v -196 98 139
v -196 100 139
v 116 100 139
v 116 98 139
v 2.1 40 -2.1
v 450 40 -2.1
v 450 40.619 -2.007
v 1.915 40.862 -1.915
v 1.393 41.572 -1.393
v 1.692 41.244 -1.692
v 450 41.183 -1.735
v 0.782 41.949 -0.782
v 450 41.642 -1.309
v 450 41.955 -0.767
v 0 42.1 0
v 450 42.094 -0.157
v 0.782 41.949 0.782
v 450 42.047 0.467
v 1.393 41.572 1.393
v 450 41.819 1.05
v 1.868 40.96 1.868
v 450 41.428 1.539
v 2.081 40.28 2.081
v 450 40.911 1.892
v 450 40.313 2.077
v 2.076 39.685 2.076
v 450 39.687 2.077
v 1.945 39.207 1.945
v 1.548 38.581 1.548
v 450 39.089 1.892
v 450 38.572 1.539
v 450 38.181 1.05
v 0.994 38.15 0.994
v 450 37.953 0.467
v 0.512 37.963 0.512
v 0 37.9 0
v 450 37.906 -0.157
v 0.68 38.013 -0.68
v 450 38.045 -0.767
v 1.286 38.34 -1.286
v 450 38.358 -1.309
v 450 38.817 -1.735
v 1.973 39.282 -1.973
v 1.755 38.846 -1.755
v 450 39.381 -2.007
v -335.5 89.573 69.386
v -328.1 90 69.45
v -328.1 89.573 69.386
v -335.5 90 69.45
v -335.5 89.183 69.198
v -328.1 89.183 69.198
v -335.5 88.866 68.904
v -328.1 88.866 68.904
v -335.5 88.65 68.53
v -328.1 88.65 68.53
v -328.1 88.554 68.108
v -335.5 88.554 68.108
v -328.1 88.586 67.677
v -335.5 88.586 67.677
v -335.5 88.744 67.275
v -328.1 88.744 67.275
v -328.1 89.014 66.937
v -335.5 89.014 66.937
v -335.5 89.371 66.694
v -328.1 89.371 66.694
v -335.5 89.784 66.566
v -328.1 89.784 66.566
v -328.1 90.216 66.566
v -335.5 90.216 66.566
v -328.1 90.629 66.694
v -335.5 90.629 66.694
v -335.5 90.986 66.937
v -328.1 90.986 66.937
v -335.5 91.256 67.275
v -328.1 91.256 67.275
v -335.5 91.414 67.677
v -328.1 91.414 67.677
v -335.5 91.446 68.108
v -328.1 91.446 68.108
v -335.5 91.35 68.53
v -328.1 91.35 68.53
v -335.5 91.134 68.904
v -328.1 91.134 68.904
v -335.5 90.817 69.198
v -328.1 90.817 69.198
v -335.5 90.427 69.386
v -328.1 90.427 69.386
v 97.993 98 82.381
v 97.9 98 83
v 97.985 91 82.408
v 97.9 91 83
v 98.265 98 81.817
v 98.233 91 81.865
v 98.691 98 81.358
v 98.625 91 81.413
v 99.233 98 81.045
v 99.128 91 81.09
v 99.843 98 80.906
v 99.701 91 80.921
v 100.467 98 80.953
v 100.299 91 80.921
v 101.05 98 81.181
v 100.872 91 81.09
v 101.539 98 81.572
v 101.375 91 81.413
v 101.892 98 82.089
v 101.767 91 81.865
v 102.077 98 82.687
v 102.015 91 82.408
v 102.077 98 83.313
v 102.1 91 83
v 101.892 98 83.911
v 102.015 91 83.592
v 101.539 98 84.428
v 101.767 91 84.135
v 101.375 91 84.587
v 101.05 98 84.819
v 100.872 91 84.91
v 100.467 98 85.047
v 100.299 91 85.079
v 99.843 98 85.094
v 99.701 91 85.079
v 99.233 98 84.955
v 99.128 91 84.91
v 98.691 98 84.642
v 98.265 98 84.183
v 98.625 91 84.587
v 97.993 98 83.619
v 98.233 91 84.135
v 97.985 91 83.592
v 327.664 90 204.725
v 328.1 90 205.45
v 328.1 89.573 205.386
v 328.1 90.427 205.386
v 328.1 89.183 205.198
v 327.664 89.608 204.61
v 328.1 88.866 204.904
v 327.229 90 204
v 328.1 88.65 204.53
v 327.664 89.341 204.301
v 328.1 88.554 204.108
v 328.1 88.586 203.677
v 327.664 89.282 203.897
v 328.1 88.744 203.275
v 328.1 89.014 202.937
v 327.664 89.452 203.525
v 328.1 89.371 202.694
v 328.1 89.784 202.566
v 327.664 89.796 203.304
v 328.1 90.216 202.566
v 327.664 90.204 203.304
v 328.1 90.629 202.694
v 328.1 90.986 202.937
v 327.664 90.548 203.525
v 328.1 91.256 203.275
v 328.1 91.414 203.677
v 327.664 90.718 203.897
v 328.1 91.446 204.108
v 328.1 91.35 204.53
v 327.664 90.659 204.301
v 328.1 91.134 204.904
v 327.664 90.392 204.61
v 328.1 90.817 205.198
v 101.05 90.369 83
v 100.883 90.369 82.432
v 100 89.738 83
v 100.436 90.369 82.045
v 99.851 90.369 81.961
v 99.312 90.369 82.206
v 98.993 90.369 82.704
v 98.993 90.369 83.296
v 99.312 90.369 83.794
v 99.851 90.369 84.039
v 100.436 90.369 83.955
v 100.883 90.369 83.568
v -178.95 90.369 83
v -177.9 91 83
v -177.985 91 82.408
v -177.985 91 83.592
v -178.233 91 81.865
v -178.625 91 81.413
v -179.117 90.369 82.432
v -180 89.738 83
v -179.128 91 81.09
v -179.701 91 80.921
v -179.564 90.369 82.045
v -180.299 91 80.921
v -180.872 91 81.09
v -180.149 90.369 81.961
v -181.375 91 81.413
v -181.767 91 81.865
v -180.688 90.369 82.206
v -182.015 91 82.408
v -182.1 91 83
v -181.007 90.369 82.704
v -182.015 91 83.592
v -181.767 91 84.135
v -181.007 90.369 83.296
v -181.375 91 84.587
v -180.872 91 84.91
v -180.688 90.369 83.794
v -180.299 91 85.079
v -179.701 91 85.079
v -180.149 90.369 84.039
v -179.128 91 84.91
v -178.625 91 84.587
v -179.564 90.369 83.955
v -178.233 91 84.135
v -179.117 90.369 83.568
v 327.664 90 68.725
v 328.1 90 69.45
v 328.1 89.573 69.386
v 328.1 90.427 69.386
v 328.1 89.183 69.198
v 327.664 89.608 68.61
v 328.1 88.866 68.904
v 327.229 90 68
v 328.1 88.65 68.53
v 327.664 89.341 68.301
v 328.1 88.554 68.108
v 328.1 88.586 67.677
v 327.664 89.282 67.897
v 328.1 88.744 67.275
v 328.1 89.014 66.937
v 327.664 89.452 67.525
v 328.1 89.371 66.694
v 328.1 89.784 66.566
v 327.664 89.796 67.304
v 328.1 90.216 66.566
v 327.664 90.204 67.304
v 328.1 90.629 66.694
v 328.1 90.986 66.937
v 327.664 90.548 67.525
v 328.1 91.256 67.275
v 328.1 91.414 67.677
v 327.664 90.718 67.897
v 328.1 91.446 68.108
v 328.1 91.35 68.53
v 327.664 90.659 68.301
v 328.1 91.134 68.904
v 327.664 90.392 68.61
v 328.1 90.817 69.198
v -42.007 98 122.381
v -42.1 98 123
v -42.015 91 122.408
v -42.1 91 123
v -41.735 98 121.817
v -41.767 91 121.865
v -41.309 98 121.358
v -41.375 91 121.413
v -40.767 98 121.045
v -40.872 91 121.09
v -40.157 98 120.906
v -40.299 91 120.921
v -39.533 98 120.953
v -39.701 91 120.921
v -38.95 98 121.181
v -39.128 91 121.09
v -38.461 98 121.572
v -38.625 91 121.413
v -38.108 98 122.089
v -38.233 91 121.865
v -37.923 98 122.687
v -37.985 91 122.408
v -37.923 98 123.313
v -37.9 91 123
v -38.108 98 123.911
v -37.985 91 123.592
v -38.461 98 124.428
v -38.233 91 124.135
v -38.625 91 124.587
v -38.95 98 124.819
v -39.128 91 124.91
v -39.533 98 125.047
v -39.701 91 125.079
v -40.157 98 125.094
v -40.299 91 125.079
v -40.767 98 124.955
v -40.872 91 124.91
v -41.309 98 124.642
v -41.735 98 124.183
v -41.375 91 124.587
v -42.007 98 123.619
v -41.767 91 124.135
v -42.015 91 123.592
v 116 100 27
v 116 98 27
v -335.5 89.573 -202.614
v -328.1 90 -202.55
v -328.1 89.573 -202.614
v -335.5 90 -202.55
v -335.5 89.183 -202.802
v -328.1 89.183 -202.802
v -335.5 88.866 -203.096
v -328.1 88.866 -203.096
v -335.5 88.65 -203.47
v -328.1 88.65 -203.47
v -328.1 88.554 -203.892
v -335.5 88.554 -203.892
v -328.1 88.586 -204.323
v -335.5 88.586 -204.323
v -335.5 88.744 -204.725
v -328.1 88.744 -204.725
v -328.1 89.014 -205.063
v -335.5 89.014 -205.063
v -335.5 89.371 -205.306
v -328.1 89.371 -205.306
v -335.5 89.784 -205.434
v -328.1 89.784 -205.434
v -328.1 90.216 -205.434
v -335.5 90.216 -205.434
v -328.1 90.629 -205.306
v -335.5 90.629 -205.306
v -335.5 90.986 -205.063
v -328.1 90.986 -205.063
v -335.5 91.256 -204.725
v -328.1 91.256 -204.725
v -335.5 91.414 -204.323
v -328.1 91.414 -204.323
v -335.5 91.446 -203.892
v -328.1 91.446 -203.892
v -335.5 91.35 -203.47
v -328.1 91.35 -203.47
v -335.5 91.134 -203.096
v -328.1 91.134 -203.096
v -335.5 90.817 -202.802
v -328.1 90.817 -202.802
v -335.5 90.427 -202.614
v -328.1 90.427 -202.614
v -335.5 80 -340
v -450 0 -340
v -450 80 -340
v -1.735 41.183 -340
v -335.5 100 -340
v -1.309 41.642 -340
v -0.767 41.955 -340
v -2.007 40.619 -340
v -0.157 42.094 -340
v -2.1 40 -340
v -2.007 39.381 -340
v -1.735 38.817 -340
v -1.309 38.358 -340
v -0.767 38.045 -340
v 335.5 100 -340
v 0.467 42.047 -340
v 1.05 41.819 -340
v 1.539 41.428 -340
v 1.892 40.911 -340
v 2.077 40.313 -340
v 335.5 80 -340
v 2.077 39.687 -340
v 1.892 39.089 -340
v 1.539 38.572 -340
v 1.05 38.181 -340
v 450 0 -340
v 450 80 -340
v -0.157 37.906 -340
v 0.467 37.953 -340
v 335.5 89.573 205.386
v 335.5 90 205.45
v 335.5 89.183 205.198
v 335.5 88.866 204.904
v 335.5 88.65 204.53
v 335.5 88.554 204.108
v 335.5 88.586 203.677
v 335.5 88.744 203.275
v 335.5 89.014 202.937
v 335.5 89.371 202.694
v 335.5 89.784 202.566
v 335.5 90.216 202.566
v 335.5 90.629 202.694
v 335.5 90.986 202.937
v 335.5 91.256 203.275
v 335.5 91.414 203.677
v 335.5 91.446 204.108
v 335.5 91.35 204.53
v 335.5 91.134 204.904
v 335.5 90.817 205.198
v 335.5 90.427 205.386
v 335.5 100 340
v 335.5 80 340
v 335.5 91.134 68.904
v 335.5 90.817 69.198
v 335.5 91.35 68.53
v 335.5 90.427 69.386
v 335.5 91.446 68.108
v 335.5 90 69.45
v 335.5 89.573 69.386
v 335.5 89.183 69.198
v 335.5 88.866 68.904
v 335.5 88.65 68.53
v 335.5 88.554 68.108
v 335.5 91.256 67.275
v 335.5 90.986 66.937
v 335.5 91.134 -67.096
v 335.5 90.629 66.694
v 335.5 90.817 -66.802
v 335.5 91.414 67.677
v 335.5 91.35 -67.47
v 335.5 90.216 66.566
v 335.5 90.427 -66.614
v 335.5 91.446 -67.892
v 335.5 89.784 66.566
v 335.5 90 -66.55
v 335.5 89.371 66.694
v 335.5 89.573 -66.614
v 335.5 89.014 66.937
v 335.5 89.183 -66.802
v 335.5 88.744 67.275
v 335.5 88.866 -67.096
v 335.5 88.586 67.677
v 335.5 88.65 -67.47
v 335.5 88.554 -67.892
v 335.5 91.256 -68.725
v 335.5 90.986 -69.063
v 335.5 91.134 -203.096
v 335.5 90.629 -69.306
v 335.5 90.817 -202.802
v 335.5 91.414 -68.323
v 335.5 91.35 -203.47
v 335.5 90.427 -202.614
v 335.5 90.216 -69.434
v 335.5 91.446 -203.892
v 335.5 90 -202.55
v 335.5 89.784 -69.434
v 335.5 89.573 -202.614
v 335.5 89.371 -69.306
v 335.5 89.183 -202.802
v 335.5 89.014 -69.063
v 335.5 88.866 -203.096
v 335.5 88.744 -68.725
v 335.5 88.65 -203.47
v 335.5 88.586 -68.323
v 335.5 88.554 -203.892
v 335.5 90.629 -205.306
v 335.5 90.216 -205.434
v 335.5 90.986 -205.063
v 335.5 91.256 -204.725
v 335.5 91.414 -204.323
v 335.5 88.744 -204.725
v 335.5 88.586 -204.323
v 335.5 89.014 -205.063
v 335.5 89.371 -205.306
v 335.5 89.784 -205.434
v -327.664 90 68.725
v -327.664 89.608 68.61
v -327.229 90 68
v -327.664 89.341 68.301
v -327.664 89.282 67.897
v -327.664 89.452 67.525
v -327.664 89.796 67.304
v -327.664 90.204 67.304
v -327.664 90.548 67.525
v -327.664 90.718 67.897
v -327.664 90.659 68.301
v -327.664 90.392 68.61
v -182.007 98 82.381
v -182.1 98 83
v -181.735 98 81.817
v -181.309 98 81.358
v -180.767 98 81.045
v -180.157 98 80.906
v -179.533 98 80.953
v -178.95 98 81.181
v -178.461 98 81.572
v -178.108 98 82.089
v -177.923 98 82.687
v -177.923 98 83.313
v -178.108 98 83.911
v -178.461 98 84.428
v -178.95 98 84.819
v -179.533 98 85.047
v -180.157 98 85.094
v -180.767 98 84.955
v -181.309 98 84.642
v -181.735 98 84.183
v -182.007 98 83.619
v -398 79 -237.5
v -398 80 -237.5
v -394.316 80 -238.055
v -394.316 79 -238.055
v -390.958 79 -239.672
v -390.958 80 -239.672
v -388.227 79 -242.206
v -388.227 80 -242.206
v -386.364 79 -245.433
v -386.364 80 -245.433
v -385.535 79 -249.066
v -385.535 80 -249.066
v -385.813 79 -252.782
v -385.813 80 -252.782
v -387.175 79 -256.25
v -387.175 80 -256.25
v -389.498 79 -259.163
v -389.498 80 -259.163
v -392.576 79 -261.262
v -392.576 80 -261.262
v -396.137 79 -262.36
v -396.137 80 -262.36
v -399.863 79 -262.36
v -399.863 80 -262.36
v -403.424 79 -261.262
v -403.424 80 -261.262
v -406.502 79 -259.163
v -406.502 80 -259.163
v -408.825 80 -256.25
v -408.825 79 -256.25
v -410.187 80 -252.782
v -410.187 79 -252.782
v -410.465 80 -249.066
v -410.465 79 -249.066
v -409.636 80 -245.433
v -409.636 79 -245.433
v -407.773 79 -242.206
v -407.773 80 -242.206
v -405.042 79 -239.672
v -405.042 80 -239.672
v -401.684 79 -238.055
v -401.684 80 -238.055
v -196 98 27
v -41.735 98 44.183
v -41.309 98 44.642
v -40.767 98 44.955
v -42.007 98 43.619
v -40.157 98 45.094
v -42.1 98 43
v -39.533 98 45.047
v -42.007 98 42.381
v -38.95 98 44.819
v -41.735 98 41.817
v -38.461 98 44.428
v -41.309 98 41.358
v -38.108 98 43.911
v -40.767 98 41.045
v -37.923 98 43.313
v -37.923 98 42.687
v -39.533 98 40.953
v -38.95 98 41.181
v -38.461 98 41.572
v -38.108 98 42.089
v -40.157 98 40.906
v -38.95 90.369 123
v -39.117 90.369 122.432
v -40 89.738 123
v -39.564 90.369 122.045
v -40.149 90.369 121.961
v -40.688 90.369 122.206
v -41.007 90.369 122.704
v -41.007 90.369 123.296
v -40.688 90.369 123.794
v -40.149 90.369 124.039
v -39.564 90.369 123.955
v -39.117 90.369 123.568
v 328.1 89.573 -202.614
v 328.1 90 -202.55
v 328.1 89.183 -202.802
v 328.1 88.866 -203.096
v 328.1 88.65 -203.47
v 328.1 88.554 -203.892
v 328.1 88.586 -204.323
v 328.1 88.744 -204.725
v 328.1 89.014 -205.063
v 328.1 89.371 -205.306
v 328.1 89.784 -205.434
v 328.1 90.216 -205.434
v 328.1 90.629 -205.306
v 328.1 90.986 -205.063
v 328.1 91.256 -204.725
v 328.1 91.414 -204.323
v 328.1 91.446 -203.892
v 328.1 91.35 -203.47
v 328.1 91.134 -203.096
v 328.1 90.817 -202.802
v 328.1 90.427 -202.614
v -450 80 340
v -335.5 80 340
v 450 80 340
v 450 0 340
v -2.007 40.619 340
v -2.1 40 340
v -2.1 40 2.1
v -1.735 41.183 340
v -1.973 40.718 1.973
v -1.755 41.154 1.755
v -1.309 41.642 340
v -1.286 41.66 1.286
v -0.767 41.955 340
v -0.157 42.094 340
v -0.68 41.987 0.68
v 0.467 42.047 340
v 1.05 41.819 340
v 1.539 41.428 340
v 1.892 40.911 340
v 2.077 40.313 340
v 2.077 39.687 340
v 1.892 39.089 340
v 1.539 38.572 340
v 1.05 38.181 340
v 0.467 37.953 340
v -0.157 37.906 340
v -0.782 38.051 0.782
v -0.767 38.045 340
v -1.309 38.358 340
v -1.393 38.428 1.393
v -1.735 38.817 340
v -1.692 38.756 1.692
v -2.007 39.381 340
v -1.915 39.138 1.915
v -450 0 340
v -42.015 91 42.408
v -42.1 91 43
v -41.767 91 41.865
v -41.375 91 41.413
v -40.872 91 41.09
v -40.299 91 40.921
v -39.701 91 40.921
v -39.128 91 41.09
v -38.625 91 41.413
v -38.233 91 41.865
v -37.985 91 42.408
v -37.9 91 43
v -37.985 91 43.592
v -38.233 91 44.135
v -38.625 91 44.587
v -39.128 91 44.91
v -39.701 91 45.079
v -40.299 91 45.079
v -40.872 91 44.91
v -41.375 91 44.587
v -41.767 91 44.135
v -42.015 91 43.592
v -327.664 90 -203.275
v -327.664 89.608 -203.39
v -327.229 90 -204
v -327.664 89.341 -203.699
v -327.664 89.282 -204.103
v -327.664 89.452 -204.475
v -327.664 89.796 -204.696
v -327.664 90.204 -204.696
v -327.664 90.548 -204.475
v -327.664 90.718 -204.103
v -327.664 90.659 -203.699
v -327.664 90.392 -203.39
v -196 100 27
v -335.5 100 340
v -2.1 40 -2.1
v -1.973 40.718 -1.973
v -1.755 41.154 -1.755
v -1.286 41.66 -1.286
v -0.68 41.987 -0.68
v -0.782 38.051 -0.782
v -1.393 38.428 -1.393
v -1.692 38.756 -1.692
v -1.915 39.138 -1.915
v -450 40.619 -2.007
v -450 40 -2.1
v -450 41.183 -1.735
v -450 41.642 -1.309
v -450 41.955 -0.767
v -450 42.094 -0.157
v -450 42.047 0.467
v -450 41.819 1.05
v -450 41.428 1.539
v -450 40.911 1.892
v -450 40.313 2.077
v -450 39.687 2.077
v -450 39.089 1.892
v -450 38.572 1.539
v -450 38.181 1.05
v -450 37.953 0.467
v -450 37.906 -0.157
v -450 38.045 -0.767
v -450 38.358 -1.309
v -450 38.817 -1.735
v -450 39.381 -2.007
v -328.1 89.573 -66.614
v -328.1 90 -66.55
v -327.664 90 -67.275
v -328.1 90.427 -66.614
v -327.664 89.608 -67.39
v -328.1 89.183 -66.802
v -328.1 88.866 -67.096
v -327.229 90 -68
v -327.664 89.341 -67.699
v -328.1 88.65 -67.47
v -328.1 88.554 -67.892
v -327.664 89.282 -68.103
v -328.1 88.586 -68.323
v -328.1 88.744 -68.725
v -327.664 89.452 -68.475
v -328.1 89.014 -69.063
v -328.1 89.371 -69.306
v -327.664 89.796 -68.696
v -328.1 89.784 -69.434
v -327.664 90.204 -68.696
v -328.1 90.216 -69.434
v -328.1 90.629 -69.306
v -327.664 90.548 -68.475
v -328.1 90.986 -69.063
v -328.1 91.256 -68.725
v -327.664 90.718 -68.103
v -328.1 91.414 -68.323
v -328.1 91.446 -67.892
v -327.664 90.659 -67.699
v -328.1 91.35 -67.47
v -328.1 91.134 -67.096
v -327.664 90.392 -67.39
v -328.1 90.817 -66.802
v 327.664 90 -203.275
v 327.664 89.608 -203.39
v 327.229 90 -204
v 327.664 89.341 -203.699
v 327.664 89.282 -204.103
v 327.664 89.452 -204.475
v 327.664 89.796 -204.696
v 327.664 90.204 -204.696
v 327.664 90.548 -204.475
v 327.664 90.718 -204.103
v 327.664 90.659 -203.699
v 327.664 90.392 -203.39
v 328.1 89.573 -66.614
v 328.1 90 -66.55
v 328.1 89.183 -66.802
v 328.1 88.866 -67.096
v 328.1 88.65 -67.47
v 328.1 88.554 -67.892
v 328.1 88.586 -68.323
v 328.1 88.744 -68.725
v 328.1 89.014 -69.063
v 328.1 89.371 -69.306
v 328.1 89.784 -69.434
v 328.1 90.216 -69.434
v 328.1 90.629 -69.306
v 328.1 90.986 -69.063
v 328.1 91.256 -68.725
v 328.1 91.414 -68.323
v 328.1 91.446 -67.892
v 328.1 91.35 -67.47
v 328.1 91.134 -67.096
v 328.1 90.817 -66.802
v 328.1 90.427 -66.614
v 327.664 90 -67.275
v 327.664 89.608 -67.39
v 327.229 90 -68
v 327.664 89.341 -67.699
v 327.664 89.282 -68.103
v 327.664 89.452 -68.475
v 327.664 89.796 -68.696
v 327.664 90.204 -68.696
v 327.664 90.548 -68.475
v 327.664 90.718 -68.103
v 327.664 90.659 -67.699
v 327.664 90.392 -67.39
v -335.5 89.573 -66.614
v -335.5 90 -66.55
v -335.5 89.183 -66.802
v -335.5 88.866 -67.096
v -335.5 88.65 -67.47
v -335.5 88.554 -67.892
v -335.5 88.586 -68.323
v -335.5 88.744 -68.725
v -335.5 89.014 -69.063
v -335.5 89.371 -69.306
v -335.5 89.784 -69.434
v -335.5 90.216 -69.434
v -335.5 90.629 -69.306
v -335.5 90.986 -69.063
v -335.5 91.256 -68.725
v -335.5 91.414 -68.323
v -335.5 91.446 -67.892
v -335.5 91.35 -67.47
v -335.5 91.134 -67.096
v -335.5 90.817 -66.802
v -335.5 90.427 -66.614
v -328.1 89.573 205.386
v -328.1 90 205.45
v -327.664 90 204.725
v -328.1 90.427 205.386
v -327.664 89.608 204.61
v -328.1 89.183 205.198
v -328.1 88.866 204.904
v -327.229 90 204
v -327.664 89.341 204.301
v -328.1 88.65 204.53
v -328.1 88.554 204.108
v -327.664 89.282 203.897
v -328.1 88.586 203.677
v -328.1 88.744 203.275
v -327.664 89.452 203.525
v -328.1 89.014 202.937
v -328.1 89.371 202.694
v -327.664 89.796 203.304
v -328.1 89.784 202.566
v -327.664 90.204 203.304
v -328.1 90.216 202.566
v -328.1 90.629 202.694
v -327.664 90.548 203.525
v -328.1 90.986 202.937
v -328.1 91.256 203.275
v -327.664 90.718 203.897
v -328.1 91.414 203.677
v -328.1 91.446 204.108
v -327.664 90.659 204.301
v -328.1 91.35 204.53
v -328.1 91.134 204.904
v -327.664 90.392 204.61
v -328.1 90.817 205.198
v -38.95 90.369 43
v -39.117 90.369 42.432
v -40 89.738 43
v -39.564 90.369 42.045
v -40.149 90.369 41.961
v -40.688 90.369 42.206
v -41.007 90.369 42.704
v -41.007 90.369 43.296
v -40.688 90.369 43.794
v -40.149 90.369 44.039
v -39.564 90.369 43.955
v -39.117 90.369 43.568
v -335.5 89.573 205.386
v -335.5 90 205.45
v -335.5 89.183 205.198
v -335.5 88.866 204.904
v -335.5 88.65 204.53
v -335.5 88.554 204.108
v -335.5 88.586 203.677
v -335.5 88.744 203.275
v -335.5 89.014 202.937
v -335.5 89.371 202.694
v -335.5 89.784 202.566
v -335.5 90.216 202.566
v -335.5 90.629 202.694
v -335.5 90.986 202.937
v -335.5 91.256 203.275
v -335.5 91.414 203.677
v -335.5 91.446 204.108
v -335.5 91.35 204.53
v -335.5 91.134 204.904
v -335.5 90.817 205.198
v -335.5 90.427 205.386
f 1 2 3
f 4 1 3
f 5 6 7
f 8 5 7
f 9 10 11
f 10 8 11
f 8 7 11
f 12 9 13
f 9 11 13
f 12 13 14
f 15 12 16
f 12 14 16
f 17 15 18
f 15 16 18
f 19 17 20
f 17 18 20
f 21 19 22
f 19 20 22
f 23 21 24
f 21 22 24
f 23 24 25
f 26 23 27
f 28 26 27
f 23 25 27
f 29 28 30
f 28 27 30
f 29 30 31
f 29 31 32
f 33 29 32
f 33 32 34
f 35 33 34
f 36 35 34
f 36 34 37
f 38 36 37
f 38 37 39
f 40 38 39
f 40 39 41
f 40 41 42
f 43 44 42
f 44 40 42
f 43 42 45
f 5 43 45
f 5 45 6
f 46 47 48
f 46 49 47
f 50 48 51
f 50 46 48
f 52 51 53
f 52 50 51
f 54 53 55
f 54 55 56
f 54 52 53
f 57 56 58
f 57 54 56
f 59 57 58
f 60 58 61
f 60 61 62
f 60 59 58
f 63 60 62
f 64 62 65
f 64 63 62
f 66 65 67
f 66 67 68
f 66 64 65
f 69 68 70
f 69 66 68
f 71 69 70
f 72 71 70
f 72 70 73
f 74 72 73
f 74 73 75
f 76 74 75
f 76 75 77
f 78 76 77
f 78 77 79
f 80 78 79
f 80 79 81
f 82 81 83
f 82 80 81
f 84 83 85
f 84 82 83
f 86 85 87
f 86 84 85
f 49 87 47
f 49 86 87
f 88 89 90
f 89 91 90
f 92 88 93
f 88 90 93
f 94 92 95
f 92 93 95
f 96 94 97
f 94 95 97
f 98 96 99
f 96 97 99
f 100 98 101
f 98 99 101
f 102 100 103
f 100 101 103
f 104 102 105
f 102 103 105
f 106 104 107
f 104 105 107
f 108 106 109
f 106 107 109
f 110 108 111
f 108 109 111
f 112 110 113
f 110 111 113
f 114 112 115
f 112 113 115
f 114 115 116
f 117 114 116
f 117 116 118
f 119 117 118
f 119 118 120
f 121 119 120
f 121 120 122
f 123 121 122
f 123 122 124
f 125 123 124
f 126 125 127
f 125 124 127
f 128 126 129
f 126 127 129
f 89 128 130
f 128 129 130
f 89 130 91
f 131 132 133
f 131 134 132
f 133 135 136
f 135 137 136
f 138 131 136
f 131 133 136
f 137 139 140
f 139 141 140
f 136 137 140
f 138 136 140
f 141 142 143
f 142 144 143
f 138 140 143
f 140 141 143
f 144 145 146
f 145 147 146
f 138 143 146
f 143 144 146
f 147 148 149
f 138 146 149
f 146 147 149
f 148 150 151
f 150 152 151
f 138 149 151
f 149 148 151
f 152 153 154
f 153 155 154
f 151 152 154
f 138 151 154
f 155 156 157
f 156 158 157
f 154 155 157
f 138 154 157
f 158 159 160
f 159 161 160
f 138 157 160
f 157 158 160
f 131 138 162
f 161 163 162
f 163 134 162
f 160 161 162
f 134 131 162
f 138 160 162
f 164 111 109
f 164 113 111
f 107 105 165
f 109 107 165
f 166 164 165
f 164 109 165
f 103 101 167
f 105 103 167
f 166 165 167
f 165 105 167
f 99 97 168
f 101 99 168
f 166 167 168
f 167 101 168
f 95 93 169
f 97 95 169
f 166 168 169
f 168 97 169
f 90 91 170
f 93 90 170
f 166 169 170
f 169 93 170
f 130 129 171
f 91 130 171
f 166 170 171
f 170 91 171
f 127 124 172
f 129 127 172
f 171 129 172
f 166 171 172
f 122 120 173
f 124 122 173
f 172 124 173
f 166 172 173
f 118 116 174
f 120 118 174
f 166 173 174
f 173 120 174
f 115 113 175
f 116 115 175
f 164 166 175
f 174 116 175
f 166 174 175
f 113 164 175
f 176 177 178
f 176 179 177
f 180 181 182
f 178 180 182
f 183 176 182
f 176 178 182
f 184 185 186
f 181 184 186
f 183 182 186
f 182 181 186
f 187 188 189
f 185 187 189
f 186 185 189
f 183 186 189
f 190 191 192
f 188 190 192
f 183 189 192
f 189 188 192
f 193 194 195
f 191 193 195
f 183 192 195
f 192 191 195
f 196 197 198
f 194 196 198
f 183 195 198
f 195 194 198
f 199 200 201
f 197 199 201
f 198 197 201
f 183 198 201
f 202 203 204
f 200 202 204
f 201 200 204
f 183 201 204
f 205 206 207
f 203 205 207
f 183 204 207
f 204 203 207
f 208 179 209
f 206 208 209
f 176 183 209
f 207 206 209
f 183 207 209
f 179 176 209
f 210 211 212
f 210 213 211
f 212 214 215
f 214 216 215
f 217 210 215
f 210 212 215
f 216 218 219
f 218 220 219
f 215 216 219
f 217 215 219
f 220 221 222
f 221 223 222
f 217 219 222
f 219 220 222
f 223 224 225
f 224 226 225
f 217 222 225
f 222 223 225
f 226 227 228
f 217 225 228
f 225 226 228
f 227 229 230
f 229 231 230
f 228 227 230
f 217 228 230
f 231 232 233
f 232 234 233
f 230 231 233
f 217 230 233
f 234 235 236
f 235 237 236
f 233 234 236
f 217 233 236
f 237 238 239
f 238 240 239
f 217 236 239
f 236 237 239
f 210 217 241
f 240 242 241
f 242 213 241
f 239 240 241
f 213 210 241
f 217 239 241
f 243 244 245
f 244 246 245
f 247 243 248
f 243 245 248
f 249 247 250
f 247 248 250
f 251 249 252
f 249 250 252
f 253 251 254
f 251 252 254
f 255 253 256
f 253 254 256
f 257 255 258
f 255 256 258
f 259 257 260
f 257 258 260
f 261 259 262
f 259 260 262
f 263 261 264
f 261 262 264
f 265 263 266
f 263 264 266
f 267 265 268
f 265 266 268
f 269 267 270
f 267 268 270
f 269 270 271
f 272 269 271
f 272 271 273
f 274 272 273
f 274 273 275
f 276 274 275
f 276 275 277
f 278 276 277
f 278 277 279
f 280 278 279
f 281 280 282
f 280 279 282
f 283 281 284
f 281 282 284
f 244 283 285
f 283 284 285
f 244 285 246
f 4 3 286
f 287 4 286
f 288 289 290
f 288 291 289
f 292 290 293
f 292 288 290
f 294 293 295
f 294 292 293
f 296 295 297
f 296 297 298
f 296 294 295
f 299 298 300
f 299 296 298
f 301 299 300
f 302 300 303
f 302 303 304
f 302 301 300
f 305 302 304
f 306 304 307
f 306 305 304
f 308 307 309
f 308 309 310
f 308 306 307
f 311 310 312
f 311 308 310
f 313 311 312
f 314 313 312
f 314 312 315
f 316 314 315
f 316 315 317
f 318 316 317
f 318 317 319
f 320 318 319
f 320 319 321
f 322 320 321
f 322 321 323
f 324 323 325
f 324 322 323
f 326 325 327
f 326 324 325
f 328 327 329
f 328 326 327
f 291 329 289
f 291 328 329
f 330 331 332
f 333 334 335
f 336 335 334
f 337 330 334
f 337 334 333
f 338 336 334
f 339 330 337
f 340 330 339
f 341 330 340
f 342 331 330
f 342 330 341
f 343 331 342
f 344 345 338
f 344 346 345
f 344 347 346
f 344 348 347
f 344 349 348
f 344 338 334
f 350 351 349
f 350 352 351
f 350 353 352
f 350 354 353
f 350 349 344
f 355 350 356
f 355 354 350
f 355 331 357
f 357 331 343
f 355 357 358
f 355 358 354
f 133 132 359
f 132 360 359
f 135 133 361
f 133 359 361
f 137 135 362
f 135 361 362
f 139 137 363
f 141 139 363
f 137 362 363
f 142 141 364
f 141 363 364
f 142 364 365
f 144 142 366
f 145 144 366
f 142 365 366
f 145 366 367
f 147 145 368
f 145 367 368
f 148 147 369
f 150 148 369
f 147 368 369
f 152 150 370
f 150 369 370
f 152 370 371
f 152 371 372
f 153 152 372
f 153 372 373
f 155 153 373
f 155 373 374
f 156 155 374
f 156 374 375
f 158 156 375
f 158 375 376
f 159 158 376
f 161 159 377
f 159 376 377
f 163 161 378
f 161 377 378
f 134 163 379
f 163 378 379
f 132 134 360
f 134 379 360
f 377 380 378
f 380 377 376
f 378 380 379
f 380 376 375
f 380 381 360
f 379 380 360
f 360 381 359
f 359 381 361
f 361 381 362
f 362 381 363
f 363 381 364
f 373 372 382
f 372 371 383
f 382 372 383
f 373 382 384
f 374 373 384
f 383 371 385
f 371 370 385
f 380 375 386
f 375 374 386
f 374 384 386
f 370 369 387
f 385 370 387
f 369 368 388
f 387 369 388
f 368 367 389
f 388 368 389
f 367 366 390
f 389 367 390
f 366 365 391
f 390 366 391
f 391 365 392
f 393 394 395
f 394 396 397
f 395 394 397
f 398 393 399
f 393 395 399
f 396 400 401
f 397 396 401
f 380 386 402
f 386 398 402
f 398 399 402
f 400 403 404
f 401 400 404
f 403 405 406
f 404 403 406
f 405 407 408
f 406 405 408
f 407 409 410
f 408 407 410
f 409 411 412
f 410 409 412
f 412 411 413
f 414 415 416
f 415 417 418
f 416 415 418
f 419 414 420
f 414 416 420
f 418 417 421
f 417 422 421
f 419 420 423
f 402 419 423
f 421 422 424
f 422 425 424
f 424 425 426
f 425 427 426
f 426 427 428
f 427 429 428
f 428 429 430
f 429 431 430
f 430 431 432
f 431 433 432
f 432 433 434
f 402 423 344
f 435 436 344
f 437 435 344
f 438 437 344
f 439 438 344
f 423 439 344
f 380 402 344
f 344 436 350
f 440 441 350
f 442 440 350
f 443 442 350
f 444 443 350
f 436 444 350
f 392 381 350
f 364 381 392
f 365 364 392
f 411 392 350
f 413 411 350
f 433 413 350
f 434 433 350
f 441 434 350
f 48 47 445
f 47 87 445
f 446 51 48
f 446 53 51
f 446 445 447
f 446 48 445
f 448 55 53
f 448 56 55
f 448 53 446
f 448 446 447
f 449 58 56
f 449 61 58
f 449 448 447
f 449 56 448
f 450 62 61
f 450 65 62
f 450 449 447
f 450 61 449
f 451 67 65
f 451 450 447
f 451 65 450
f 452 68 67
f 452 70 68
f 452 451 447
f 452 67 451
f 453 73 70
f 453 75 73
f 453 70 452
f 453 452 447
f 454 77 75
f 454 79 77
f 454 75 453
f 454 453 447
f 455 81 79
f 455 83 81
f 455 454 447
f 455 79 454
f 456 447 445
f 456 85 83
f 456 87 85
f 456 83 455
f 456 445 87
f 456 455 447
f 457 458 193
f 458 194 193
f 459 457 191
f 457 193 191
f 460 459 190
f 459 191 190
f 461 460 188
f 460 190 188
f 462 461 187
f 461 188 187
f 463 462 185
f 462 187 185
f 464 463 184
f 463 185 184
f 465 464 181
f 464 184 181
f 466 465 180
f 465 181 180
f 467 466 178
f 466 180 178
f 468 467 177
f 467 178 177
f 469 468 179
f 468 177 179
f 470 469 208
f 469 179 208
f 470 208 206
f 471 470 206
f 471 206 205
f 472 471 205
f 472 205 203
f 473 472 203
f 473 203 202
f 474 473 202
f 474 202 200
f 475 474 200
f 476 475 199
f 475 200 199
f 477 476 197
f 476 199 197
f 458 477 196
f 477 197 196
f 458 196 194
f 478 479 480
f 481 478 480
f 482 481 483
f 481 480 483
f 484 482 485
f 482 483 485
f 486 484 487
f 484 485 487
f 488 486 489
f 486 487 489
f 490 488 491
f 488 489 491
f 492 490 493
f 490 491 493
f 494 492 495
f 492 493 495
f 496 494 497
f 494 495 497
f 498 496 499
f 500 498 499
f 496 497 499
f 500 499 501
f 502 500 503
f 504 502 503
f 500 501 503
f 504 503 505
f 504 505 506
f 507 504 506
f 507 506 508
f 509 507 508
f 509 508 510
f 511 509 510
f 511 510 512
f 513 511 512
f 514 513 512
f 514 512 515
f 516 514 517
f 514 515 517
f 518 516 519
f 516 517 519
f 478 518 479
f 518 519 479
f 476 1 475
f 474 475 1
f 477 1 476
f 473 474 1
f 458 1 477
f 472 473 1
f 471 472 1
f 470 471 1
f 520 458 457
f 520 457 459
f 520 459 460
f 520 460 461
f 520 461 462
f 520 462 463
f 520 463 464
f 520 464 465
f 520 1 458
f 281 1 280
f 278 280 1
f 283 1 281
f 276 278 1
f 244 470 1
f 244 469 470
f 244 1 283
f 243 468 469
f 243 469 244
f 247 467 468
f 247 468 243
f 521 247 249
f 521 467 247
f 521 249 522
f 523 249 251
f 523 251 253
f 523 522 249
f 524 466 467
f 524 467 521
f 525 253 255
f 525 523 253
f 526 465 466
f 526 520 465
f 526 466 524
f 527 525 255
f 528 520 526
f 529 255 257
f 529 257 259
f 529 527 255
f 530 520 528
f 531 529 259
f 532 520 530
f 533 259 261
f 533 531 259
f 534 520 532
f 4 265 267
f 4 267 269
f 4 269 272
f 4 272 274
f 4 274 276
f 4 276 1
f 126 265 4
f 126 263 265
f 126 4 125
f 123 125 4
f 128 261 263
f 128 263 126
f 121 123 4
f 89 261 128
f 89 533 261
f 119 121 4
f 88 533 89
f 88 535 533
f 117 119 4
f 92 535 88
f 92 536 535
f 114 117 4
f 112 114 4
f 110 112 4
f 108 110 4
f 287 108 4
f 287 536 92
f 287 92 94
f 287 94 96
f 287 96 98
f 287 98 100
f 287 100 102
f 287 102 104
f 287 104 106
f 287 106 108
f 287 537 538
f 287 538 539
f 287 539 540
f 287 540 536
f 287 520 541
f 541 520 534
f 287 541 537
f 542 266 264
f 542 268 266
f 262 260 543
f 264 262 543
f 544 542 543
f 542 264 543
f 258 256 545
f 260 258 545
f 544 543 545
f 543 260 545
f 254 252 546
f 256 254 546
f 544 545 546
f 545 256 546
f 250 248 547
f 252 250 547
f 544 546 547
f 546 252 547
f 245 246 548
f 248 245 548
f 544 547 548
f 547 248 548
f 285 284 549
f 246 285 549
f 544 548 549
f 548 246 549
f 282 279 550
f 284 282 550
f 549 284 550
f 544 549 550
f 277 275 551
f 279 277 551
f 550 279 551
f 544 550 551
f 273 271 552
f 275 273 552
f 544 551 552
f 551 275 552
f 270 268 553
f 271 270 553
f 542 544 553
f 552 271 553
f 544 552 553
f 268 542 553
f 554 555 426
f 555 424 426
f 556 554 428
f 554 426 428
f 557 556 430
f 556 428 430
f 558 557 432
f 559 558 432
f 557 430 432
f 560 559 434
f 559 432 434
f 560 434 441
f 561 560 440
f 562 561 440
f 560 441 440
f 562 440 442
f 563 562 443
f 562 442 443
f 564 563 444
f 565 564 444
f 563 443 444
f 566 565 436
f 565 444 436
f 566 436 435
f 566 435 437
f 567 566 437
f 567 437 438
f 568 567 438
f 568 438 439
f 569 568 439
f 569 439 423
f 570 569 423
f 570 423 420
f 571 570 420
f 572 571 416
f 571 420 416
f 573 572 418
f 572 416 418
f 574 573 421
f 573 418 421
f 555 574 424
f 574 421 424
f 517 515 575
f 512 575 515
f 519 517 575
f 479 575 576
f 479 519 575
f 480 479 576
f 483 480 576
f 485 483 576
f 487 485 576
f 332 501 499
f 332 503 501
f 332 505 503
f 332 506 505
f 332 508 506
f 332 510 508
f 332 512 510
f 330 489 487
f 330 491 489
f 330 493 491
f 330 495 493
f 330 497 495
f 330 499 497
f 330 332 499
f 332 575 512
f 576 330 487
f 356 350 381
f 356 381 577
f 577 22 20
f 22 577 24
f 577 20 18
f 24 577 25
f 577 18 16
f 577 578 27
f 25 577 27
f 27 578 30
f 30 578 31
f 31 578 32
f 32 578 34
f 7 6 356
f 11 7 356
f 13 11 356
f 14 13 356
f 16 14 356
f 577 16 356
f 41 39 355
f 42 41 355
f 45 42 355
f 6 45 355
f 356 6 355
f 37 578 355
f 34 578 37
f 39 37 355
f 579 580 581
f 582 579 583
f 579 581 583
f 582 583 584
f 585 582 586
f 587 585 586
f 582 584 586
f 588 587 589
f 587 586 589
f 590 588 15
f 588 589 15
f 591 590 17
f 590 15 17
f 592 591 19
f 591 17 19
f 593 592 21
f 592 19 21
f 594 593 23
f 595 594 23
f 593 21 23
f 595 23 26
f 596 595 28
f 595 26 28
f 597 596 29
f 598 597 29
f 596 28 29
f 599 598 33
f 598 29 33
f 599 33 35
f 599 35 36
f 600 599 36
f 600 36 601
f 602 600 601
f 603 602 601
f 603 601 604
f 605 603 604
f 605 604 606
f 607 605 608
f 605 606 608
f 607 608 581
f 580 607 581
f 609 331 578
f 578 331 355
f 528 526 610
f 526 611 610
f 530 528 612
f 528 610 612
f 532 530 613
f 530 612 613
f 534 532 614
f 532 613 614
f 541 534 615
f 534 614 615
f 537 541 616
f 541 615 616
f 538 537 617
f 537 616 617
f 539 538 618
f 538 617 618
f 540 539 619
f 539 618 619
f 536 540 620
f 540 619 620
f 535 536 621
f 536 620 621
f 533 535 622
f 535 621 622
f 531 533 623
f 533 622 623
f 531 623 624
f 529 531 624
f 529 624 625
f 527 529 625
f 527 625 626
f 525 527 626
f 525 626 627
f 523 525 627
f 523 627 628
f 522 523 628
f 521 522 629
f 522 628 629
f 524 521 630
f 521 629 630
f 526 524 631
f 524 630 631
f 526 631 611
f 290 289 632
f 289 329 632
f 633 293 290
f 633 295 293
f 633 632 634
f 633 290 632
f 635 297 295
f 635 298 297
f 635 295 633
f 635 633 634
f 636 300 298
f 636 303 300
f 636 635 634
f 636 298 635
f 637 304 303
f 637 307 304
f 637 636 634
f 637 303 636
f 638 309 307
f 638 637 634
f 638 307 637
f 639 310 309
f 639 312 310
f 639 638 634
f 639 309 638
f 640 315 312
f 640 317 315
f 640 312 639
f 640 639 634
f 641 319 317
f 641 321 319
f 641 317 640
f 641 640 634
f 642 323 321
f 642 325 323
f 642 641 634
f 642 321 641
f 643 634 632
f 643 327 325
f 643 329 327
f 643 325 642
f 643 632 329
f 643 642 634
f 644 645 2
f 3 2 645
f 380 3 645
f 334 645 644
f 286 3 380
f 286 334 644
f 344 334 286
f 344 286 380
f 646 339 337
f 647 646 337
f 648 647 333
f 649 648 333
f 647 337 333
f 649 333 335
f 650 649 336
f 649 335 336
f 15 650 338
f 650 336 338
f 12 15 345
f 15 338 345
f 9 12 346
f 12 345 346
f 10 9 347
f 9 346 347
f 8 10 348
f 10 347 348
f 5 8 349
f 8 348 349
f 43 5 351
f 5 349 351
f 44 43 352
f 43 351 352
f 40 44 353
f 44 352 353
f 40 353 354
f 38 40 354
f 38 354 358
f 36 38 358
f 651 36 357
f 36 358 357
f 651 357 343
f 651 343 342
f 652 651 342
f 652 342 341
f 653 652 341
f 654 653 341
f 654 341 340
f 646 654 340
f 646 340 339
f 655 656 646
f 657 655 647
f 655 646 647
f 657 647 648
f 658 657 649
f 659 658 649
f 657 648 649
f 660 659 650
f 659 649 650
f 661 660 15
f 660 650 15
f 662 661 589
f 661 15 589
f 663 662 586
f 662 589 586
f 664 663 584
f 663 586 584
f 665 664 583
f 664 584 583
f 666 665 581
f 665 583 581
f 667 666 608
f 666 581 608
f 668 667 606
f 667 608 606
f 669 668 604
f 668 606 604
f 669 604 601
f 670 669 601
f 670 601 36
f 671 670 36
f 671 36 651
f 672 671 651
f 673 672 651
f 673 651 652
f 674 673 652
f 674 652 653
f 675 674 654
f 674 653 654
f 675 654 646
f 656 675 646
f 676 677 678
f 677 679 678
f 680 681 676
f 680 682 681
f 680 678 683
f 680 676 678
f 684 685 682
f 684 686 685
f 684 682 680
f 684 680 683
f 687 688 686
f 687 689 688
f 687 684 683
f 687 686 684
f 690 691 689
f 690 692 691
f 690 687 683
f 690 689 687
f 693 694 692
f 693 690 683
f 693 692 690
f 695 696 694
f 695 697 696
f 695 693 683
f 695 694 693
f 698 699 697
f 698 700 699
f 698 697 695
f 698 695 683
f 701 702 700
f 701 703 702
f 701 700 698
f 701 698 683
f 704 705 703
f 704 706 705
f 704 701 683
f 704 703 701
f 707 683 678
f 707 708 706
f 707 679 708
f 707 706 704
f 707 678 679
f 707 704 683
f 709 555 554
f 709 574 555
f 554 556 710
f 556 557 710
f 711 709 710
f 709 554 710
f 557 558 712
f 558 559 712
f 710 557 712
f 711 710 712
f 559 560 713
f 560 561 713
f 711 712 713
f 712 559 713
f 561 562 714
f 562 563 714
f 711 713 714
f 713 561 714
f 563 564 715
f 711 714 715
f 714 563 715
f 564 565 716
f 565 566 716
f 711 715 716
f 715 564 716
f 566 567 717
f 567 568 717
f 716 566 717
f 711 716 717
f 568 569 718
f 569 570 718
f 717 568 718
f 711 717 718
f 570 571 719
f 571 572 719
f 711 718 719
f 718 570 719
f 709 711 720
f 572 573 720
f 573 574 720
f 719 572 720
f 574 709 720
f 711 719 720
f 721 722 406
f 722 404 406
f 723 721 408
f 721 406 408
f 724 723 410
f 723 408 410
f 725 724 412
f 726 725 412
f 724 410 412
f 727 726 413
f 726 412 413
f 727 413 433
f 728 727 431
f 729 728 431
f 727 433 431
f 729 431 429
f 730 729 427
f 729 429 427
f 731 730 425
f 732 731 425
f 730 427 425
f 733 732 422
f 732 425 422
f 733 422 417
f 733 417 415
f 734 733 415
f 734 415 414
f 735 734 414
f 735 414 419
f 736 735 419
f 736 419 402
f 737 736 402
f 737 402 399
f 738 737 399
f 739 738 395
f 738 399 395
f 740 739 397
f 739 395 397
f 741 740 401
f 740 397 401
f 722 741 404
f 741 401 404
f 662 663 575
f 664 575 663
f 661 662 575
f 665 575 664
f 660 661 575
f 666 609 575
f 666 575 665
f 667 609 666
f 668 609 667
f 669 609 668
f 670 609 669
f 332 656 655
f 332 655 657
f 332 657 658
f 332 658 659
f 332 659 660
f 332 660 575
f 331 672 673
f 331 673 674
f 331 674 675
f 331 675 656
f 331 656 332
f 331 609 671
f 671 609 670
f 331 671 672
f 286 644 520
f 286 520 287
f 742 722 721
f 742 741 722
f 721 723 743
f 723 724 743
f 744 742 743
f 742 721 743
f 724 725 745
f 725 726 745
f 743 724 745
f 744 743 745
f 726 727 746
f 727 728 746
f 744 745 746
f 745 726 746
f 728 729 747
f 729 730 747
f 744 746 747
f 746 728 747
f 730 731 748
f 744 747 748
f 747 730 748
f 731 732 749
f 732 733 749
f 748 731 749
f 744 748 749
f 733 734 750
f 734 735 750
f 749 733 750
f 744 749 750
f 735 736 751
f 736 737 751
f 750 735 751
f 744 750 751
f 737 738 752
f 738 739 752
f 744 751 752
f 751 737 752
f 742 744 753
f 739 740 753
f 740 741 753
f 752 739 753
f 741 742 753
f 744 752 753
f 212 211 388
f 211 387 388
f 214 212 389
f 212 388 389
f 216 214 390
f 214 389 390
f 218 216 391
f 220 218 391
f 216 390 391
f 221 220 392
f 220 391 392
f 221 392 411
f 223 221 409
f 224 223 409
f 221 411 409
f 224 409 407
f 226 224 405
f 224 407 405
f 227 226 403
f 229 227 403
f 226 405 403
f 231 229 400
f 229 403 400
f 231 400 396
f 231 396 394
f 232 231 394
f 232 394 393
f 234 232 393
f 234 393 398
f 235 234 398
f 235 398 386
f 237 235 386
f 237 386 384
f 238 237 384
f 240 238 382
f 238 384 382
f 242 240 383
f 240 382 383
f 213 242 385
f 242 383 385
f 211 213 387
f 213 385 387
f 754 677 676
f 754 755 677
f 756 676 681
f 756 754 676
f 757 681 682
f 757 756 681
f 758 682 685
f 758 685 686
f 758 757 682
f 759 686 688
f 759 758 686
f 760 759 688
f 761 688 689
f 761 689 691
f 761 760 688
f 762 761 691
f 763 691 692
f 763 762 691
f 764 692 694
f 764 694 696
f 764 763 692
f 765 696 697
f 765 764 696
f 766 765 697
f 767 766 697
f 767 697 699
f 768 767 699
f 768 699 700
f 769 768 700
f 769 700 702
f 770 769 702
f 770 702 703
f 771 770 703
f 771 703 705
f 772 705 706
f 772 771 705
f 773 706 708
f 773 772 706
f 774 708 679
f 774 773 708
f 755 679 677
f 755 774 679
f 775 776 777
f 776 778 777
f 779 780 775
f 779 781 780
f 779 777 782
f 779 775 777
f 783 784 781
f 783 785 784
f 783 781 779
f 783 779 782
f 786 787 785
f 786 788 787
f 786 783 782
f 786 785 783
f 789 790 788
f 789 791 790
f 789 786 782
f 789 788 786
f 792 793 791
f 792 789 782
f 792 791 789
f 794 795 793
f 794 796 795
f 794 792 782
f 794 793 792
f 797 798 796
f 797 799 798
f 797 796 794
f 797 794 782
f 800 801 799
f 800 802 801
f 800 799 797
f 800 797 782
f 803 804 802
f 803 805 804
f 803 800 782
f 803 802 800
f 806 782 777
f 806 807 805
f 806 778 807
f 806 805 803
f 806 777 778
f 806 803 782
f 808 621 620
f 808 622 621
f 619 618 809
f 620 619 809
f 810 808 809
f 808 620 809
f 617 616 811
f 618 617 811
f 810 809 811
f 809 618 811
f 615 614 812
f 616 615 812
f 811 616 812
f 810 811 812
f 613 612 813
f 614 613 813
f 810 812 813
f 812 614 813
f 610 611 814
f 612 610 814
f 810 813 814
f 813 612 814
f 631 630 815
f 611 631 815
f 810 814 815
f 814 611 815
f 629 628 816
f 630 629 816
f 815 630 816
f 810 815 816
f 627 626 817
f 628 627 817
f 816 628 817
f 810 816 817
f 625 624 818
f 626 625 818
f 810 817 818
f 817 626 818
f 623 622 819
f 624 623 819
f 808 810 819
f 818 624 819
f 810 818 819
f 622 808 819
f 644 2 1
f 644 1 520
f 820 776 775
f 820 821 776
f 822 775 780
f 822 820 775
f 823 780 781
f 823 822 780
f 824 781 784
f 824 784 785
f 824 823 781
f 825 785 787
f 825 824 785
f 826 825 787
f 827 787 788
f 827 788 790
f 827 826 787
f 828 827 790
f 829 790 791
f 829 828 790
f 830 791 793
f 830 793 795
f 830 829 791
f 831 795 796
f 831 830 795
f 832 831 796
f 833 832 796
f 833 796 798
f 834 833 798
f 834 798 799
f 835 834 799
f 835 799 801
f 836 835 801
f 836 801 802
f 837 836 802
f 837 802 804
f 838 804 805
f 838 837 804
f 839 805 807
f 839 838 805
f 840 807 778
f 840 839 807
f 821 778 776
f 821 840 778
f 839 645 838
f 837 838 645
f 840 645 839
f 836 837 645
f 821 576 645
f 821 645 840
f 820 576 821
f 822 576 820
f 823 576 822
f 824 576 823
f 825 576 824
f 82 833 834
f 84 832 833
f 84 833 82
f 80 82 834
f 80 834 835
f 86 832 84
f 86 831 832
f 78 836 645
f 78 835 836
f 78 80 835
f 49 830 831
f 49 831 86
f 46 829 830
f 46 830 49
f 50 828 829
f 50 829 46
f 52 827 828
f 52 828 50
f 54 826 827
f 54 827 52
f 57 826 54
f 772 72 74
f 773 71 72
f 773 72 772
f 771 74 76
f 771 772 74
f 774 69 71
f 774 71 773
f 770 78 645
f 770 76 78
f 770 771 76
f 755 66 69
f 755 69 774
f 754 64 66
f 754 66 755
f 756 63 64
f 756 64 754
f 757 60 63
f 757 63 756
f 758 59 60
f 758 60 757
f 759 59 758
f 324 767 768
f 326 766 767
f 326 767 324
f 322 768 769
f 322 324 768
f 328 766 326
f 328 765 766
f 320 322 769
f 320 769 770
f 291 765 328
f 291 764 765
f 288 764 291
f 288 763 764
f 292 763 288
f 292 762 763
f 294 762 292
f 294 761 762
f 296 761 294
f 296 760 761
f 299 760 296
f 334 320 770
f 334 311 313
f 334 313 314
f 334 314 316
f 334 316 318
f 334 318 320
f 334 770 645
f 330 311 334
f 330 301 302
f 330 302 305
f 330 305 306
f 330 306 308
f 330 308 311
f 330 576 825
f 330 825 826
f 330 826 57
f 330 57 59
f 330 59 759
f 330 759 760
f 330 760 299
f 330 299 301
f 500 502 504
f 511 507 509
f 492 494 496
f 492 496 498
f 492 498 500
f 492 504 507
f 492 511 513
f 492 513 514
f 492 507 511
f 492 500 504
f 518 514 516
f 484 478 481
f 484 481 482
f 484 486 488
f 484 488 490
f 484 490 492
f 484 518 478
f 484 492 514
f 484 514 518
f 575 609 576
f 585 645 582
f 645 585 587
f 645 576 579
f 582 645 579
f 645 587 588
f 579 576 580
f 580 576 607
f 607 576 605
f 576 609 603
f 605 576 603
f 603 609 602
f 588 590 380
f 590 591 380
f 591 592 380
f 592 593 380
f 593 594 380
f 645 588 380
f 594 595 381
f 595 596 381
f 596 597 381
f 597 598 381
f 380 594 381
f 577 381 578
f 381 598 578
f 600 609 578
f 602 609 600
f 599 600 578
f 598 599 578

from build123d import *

# Parameters (mm, degrees)
SKETCH_1_W                    = 900
SKETCH_1_H                    = 680
EXTRUDE_1_DEPTH               = 80
SKETCH_2_W                    = 671
SKETCH_2_H                    = 680
EXTRUDE_2_DEPTH               = 20
SKETCH_4_W                    = 312
SKETCH_4_H                    = 112
CUT_EXTRUDE_1_DEPTH           = 2
HOLE_WIZARD_M5_1_D            = 4.2
HOLE_WIZARD_M5_1_DEPTH        = 9
HOLE_WIZARD_M5_1_TIP          = 1.2618073
HOLE_WIZARD_M5_2_D            = 4.2
HOLE_WIZARD_M5_3_D            = 4.2
SKETCH_15_R                   = 12.5
CUT_EXTRUDE_2_DEPTH           = 1
HOLE_WIZARD_M3_5_1_AT_2_COUNT = 2
HOLE_WIZARD_M3_5_1_AT_2_PITCH = 136
HOLE_WIZARD_M3_5_1_AT_3_COUNT = 2
HOLE_WIZARD_M3_5_1_AT_3_PITCH = 272
HOLE_WIZARD_M3_5_1_AT_4_COUNT = 2
HOLE_WIZARD_M3_5_1_AT_4_PITCH = 408


with BuildPart() as part:
    # 草图1 → 凸台-拉伸1 (new body)
    with BuildSketch(Plane(origin=(0, 0, 0), x_dir=(1, 0, 0), z_dir=(0, 1, 0))):
        Rectangle(SKETCH_1_W, SKETCH_1_H)
    extrude(amount=EXTRUDE_1_DEPTH)

    # 草图2 → 凸台-拉伸2 (add)
    with BuildSketch(Plane(origin=(0, 80, 0), x_dir=(1, 0, 0), z_dir=(0, 1, 0))):
        Rectangle(SKETCH_2_W, SKETCH_2_H)
    extrude(amount=EXTRUDE_2_DEPTH)

    # 草图4 → 切除-拉伸1 (cut)
    with BuildSketch(Plane(origin=(0, 100, 0), x_dir=(1, 0, 0), z_dir=(0, 1, 0))):
        with Locations((-40, -83)):
            Rectangle(SKETCH_4_W, SKETCH_4_H)
    extrude(amount=-CUT_EXTRUDE_1_DEPTH, mode=Mode.SUBTRACT)

    # M5 螺纹孔1
    with Locations(Plane(origin=(0, 100, 0), x_dir=(1, 0, 0), z_dir=(0, 1, 0))):
        with Locations((-180, -83), (-40, -43), (-40, -123), (100, -83)):
            Hole(HOLE_WIZARD_M5_1_D / 2, depth=HOLE_WIZARD_M5_1_DEPTH)
            with Locations((0, 0, -(HOLE_WIZARD_M5_1_DEPTH + HOLE_WIZARD_M5_1_TIP / 2))):  # 118° drill point
                Cone(0, HOLE_WIZARD_M5_1_D / 2, HOLE_WIZARD_M5_1_TIP, mode=Mode.SUBTRACT)

    # M5 螺纹孔2 (through all)
    with Locations(Plane.XY.offset(340)):
        with Locations((0, 40)):
            Hole(HOLE_WIZARD_M5_2_D / 2)

    # M5 螺纹孔3 (through all)
    with Locations(Plane.ZY.offset(450)):
        with Locations((0, 40)):
            Hole(HOLE_WIZARD_M5_3_D / 2)

    # 草图15 → 切除-拉伸2 (cut)
    with BuildSketch(Plane(origin=(0, 80, 0), x_dir=(1, 0, 0), z_dir=(0, 1, 0))):
        with Locations(Location((-398, 250, 0), (0, 0, 270))):
            Circle(SKETCH_15_R)
    extrude(amount=-CUT_EXTRUDE_2_DEPTH, mode=Mode.SUBTRACT)

    # 草图19 → M3.5 螺纹孔1 (revolve, cut)
    with BuildSketch(Plane(origin=(-335.5, 90, -204), x_dir=(0, 0, 1), z_dir=(0, 1, 0))):
        Polygon((0, 0), (0, 8.271247898), (1.45, 7.4), (1.45, 0), align=None)
    hole_wizard_m3_5_1 = revolve(axis=Axis((-341.85, 90, -204), (1, 0, 0)), mode=Mode.SUBTRACT)

    # M3.5 螺纹孔1 at 2: M3.5 螺纹孔1 ×2
    with Locations(*[(0, 0, i * HOLE_WIZARD_M3_5_1_AT_2_PITCH) for i in range(1, HOLE_WIZARD_M3_5_1_AT_2_COUNT)]):
        add(hole_wizard_m3_5_1, mode=Mode.SUBTRACT)

    # M3.5 螺纹孔1 at 3: M3.5 螺纹孔1 ×2
    with Locations(*[(0, 0, i * HOLE_WIZARD_M3_5_1_AT_3_PITCH) for i in range(1, HOLE_WIZARD_M3_5_1_AT_3_COUNT)]):
        add(hole_wizard_m3_5_1, mode=Mode.SUBTRACT)

    # M3.5 螺纹孔1 at 4: M3.5 螺纹孔1 ×2
    with Locations(*[(0, 0, i * HOLE_WIZARD_M3_5_1_AT_4_PITCH) for i in range(1, HOLE_WIZARD_M3_5_1_AT_4_COUNT)]):
        add(hole_wizard_m3_5_1, mode=Mode.SUBTRACT)

    # 镜向1: M3.5 螺纹孔1 across plane
    add(hole_wizard_m3_5_1.mirror(Plane(origin=(0, 0, 0), x_dir=(0, 0, 1), z_dir=(1, 0, 0))), mode=Mode.SUBTRACT)

    # 镜向1 copy 1 sketch → 镜向1 copy 1 (revolve, cut)
    with BuildSketch(Plane(origin=(335.5, 90, -68), x_dir=(0, 0, 1), z_dir=(0, 1, 0))):
        Polygon((0, 0), (0, -8.271247898), (1.45, -7.4), (1.45, 0), align=None)
    revolve(axis=Axis((341.85, 90, -68), (1, 0, 0)), mode=Mode.SUBTRACT)

    # 镜向1 copy 2 sketch → 镜向1 copy 2 (revolve, cut)
    with BuildSketch(Plane(origin=(335.5, 90, 68), x_dir=(0, 0, 1), z_dir=(0, 1, 0))):
        Polygon((0, 0), (0, -8.271247898), (1.45, -7.4), (1.45, 0), align=None)
    revolve(axis=Axis((341.85, 90, 68), (1, 0, 0)), mode=Mode.SUBTRACT)

    # 镜向1 copy 3 sketch → 镜向1 copy 3 (revolve, cut)
    with BuildSketch(Plane(origin=(335.5, 90, 204), x_dir=(0, 0, 1), z_dir=(0, 1, 0))):
        Polygon((0, 0), (0, -8.271247898), (1.45, -7.4), (1.45, 0), align=None)
    revolve(axis=Axis((341.85, 90, 204), (1, 0, 0)), mode=Mode.SUBTRACT)


solid = part.part
